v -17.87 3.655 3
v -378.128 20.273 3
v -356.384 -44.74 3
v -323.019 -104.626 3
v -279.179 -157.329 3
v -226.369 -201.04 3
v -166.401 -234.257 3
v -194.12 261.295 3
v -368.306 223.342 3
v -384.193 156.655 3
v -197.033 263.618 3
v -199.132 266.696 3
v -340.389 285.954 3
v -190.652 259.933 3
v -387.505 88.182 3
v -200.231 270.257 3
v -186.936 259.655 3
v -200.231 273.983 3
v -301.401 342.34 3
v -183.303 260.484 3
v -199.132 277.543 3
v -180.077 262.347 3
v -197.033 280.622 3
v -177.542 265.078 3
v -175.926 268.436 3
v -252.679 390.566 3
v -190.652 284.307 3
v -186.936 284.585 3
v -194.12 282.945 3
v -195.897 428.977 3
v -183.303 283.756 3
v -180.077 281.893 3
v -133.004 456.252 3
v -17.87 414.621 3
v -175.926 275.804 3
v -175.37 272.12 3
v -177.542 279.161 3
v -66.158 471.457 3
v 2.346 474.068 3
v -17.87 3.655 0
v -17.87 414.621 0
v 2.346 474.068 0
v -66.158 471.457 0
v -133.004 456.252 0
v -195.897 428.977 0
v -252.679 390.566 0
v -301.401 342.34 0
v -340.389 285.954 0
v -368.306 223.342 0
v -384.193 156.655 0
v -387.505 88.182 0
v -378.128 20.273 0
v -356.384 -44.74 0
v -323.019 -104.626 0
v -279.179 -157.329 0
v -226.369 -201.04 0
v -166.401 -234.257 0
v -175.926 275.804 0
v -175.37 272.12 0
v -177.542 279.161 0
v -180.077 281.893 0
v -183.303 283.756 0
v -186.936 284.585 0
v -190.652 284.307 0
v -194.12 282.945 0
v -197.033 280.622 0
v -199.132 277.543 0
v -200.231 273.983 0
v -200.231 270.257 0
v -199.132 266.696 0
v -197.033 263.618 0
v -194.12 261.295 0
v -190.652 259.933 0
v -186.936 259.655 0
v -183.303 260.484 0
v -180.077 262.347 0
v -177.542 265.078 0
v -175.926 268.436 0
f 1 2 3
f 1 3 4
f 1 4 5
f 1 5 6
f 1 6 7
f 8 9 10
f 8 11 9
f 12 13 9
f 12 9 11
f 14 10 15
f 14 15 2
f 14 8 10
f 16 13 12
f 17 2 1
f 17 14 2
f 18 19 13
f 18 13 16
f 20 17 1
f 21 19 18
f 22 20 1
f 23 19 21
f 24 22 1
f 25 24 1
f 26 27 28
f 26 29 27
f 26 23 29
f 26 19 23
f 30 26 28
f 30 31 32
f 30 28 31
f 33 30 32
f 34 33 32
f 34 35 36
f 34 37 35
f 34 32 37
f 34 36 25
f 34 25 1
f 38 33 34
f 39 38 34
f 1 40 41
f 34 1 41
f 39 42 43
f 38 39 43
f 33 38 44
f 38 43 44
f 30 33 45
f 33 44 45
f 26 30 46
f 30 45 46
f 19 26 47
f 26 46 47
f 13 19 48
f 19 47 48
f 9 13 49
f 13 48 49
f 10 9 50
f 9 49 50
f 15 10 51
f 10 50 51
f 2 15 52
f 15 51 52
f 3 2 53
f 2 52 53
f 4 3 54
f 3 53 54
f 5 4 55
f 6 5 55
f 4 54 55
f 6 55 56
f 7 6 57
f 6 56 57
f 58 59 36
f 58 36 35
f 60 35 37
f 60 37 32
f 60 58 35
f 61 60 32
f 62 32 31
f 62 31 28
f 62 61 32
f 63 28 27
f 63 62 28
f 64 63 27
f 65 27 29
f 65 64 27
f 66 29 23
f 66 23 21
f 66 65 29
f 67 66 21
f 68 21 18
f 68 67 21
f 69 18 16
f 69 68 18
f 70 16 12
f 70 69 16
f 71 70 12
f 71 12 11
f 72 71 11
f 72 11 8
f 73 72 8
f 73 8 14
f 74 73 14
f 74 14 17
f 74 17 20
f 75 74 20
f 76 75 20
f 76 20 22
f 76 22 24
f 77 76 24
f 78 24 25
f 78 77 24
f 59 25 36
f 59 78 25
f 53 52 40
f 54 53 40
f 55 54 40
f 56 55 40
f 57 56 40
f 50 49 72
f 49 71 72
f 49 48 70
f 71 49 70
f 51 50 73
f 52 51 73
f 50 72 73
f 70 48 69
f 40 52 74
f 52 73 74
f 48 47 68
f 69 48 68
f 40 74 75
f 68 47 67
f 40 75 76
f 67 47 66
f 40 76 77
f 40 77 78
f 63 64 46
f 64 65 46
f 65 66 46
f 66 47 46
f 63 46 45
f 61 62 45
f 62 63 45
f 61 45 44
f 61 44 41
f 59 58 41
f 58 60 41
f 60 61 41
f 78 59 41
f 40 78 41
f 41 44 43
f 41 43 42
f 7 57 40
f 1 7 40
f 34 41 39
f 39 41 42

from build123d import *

# Parameters (mm, degrees)
F0_R     = 12.5
F1_DEPTH = 3


with BuildPart() as f1:
    # F0 (on Top) → F1 (new body)
    with BuildSketch(Plane.XY):
        with BuildLine():
            Line((-17.870255, 414.621119), (2.345661, 474.068432))
            ThreePointArc((2.345661, 474.068432), (-377.797369, 190.367681), (-166.401004, -234.257349))
            Line((-166.401004, -234.257349), (-17.870255, 3.655279))
            Line((-17.870255, 3.655279), (-17.870255, 104.621119))
            Line((-17.870255, 104.621119), (-17.870255, 414.621119))
        make_face()
        with Locations((-187.870255, 272.119941)):
            Circle(F0_R, mode=Mode.SUBTRACT)
    extrude(amount=F1_DEPTH)


solid = f1.part
